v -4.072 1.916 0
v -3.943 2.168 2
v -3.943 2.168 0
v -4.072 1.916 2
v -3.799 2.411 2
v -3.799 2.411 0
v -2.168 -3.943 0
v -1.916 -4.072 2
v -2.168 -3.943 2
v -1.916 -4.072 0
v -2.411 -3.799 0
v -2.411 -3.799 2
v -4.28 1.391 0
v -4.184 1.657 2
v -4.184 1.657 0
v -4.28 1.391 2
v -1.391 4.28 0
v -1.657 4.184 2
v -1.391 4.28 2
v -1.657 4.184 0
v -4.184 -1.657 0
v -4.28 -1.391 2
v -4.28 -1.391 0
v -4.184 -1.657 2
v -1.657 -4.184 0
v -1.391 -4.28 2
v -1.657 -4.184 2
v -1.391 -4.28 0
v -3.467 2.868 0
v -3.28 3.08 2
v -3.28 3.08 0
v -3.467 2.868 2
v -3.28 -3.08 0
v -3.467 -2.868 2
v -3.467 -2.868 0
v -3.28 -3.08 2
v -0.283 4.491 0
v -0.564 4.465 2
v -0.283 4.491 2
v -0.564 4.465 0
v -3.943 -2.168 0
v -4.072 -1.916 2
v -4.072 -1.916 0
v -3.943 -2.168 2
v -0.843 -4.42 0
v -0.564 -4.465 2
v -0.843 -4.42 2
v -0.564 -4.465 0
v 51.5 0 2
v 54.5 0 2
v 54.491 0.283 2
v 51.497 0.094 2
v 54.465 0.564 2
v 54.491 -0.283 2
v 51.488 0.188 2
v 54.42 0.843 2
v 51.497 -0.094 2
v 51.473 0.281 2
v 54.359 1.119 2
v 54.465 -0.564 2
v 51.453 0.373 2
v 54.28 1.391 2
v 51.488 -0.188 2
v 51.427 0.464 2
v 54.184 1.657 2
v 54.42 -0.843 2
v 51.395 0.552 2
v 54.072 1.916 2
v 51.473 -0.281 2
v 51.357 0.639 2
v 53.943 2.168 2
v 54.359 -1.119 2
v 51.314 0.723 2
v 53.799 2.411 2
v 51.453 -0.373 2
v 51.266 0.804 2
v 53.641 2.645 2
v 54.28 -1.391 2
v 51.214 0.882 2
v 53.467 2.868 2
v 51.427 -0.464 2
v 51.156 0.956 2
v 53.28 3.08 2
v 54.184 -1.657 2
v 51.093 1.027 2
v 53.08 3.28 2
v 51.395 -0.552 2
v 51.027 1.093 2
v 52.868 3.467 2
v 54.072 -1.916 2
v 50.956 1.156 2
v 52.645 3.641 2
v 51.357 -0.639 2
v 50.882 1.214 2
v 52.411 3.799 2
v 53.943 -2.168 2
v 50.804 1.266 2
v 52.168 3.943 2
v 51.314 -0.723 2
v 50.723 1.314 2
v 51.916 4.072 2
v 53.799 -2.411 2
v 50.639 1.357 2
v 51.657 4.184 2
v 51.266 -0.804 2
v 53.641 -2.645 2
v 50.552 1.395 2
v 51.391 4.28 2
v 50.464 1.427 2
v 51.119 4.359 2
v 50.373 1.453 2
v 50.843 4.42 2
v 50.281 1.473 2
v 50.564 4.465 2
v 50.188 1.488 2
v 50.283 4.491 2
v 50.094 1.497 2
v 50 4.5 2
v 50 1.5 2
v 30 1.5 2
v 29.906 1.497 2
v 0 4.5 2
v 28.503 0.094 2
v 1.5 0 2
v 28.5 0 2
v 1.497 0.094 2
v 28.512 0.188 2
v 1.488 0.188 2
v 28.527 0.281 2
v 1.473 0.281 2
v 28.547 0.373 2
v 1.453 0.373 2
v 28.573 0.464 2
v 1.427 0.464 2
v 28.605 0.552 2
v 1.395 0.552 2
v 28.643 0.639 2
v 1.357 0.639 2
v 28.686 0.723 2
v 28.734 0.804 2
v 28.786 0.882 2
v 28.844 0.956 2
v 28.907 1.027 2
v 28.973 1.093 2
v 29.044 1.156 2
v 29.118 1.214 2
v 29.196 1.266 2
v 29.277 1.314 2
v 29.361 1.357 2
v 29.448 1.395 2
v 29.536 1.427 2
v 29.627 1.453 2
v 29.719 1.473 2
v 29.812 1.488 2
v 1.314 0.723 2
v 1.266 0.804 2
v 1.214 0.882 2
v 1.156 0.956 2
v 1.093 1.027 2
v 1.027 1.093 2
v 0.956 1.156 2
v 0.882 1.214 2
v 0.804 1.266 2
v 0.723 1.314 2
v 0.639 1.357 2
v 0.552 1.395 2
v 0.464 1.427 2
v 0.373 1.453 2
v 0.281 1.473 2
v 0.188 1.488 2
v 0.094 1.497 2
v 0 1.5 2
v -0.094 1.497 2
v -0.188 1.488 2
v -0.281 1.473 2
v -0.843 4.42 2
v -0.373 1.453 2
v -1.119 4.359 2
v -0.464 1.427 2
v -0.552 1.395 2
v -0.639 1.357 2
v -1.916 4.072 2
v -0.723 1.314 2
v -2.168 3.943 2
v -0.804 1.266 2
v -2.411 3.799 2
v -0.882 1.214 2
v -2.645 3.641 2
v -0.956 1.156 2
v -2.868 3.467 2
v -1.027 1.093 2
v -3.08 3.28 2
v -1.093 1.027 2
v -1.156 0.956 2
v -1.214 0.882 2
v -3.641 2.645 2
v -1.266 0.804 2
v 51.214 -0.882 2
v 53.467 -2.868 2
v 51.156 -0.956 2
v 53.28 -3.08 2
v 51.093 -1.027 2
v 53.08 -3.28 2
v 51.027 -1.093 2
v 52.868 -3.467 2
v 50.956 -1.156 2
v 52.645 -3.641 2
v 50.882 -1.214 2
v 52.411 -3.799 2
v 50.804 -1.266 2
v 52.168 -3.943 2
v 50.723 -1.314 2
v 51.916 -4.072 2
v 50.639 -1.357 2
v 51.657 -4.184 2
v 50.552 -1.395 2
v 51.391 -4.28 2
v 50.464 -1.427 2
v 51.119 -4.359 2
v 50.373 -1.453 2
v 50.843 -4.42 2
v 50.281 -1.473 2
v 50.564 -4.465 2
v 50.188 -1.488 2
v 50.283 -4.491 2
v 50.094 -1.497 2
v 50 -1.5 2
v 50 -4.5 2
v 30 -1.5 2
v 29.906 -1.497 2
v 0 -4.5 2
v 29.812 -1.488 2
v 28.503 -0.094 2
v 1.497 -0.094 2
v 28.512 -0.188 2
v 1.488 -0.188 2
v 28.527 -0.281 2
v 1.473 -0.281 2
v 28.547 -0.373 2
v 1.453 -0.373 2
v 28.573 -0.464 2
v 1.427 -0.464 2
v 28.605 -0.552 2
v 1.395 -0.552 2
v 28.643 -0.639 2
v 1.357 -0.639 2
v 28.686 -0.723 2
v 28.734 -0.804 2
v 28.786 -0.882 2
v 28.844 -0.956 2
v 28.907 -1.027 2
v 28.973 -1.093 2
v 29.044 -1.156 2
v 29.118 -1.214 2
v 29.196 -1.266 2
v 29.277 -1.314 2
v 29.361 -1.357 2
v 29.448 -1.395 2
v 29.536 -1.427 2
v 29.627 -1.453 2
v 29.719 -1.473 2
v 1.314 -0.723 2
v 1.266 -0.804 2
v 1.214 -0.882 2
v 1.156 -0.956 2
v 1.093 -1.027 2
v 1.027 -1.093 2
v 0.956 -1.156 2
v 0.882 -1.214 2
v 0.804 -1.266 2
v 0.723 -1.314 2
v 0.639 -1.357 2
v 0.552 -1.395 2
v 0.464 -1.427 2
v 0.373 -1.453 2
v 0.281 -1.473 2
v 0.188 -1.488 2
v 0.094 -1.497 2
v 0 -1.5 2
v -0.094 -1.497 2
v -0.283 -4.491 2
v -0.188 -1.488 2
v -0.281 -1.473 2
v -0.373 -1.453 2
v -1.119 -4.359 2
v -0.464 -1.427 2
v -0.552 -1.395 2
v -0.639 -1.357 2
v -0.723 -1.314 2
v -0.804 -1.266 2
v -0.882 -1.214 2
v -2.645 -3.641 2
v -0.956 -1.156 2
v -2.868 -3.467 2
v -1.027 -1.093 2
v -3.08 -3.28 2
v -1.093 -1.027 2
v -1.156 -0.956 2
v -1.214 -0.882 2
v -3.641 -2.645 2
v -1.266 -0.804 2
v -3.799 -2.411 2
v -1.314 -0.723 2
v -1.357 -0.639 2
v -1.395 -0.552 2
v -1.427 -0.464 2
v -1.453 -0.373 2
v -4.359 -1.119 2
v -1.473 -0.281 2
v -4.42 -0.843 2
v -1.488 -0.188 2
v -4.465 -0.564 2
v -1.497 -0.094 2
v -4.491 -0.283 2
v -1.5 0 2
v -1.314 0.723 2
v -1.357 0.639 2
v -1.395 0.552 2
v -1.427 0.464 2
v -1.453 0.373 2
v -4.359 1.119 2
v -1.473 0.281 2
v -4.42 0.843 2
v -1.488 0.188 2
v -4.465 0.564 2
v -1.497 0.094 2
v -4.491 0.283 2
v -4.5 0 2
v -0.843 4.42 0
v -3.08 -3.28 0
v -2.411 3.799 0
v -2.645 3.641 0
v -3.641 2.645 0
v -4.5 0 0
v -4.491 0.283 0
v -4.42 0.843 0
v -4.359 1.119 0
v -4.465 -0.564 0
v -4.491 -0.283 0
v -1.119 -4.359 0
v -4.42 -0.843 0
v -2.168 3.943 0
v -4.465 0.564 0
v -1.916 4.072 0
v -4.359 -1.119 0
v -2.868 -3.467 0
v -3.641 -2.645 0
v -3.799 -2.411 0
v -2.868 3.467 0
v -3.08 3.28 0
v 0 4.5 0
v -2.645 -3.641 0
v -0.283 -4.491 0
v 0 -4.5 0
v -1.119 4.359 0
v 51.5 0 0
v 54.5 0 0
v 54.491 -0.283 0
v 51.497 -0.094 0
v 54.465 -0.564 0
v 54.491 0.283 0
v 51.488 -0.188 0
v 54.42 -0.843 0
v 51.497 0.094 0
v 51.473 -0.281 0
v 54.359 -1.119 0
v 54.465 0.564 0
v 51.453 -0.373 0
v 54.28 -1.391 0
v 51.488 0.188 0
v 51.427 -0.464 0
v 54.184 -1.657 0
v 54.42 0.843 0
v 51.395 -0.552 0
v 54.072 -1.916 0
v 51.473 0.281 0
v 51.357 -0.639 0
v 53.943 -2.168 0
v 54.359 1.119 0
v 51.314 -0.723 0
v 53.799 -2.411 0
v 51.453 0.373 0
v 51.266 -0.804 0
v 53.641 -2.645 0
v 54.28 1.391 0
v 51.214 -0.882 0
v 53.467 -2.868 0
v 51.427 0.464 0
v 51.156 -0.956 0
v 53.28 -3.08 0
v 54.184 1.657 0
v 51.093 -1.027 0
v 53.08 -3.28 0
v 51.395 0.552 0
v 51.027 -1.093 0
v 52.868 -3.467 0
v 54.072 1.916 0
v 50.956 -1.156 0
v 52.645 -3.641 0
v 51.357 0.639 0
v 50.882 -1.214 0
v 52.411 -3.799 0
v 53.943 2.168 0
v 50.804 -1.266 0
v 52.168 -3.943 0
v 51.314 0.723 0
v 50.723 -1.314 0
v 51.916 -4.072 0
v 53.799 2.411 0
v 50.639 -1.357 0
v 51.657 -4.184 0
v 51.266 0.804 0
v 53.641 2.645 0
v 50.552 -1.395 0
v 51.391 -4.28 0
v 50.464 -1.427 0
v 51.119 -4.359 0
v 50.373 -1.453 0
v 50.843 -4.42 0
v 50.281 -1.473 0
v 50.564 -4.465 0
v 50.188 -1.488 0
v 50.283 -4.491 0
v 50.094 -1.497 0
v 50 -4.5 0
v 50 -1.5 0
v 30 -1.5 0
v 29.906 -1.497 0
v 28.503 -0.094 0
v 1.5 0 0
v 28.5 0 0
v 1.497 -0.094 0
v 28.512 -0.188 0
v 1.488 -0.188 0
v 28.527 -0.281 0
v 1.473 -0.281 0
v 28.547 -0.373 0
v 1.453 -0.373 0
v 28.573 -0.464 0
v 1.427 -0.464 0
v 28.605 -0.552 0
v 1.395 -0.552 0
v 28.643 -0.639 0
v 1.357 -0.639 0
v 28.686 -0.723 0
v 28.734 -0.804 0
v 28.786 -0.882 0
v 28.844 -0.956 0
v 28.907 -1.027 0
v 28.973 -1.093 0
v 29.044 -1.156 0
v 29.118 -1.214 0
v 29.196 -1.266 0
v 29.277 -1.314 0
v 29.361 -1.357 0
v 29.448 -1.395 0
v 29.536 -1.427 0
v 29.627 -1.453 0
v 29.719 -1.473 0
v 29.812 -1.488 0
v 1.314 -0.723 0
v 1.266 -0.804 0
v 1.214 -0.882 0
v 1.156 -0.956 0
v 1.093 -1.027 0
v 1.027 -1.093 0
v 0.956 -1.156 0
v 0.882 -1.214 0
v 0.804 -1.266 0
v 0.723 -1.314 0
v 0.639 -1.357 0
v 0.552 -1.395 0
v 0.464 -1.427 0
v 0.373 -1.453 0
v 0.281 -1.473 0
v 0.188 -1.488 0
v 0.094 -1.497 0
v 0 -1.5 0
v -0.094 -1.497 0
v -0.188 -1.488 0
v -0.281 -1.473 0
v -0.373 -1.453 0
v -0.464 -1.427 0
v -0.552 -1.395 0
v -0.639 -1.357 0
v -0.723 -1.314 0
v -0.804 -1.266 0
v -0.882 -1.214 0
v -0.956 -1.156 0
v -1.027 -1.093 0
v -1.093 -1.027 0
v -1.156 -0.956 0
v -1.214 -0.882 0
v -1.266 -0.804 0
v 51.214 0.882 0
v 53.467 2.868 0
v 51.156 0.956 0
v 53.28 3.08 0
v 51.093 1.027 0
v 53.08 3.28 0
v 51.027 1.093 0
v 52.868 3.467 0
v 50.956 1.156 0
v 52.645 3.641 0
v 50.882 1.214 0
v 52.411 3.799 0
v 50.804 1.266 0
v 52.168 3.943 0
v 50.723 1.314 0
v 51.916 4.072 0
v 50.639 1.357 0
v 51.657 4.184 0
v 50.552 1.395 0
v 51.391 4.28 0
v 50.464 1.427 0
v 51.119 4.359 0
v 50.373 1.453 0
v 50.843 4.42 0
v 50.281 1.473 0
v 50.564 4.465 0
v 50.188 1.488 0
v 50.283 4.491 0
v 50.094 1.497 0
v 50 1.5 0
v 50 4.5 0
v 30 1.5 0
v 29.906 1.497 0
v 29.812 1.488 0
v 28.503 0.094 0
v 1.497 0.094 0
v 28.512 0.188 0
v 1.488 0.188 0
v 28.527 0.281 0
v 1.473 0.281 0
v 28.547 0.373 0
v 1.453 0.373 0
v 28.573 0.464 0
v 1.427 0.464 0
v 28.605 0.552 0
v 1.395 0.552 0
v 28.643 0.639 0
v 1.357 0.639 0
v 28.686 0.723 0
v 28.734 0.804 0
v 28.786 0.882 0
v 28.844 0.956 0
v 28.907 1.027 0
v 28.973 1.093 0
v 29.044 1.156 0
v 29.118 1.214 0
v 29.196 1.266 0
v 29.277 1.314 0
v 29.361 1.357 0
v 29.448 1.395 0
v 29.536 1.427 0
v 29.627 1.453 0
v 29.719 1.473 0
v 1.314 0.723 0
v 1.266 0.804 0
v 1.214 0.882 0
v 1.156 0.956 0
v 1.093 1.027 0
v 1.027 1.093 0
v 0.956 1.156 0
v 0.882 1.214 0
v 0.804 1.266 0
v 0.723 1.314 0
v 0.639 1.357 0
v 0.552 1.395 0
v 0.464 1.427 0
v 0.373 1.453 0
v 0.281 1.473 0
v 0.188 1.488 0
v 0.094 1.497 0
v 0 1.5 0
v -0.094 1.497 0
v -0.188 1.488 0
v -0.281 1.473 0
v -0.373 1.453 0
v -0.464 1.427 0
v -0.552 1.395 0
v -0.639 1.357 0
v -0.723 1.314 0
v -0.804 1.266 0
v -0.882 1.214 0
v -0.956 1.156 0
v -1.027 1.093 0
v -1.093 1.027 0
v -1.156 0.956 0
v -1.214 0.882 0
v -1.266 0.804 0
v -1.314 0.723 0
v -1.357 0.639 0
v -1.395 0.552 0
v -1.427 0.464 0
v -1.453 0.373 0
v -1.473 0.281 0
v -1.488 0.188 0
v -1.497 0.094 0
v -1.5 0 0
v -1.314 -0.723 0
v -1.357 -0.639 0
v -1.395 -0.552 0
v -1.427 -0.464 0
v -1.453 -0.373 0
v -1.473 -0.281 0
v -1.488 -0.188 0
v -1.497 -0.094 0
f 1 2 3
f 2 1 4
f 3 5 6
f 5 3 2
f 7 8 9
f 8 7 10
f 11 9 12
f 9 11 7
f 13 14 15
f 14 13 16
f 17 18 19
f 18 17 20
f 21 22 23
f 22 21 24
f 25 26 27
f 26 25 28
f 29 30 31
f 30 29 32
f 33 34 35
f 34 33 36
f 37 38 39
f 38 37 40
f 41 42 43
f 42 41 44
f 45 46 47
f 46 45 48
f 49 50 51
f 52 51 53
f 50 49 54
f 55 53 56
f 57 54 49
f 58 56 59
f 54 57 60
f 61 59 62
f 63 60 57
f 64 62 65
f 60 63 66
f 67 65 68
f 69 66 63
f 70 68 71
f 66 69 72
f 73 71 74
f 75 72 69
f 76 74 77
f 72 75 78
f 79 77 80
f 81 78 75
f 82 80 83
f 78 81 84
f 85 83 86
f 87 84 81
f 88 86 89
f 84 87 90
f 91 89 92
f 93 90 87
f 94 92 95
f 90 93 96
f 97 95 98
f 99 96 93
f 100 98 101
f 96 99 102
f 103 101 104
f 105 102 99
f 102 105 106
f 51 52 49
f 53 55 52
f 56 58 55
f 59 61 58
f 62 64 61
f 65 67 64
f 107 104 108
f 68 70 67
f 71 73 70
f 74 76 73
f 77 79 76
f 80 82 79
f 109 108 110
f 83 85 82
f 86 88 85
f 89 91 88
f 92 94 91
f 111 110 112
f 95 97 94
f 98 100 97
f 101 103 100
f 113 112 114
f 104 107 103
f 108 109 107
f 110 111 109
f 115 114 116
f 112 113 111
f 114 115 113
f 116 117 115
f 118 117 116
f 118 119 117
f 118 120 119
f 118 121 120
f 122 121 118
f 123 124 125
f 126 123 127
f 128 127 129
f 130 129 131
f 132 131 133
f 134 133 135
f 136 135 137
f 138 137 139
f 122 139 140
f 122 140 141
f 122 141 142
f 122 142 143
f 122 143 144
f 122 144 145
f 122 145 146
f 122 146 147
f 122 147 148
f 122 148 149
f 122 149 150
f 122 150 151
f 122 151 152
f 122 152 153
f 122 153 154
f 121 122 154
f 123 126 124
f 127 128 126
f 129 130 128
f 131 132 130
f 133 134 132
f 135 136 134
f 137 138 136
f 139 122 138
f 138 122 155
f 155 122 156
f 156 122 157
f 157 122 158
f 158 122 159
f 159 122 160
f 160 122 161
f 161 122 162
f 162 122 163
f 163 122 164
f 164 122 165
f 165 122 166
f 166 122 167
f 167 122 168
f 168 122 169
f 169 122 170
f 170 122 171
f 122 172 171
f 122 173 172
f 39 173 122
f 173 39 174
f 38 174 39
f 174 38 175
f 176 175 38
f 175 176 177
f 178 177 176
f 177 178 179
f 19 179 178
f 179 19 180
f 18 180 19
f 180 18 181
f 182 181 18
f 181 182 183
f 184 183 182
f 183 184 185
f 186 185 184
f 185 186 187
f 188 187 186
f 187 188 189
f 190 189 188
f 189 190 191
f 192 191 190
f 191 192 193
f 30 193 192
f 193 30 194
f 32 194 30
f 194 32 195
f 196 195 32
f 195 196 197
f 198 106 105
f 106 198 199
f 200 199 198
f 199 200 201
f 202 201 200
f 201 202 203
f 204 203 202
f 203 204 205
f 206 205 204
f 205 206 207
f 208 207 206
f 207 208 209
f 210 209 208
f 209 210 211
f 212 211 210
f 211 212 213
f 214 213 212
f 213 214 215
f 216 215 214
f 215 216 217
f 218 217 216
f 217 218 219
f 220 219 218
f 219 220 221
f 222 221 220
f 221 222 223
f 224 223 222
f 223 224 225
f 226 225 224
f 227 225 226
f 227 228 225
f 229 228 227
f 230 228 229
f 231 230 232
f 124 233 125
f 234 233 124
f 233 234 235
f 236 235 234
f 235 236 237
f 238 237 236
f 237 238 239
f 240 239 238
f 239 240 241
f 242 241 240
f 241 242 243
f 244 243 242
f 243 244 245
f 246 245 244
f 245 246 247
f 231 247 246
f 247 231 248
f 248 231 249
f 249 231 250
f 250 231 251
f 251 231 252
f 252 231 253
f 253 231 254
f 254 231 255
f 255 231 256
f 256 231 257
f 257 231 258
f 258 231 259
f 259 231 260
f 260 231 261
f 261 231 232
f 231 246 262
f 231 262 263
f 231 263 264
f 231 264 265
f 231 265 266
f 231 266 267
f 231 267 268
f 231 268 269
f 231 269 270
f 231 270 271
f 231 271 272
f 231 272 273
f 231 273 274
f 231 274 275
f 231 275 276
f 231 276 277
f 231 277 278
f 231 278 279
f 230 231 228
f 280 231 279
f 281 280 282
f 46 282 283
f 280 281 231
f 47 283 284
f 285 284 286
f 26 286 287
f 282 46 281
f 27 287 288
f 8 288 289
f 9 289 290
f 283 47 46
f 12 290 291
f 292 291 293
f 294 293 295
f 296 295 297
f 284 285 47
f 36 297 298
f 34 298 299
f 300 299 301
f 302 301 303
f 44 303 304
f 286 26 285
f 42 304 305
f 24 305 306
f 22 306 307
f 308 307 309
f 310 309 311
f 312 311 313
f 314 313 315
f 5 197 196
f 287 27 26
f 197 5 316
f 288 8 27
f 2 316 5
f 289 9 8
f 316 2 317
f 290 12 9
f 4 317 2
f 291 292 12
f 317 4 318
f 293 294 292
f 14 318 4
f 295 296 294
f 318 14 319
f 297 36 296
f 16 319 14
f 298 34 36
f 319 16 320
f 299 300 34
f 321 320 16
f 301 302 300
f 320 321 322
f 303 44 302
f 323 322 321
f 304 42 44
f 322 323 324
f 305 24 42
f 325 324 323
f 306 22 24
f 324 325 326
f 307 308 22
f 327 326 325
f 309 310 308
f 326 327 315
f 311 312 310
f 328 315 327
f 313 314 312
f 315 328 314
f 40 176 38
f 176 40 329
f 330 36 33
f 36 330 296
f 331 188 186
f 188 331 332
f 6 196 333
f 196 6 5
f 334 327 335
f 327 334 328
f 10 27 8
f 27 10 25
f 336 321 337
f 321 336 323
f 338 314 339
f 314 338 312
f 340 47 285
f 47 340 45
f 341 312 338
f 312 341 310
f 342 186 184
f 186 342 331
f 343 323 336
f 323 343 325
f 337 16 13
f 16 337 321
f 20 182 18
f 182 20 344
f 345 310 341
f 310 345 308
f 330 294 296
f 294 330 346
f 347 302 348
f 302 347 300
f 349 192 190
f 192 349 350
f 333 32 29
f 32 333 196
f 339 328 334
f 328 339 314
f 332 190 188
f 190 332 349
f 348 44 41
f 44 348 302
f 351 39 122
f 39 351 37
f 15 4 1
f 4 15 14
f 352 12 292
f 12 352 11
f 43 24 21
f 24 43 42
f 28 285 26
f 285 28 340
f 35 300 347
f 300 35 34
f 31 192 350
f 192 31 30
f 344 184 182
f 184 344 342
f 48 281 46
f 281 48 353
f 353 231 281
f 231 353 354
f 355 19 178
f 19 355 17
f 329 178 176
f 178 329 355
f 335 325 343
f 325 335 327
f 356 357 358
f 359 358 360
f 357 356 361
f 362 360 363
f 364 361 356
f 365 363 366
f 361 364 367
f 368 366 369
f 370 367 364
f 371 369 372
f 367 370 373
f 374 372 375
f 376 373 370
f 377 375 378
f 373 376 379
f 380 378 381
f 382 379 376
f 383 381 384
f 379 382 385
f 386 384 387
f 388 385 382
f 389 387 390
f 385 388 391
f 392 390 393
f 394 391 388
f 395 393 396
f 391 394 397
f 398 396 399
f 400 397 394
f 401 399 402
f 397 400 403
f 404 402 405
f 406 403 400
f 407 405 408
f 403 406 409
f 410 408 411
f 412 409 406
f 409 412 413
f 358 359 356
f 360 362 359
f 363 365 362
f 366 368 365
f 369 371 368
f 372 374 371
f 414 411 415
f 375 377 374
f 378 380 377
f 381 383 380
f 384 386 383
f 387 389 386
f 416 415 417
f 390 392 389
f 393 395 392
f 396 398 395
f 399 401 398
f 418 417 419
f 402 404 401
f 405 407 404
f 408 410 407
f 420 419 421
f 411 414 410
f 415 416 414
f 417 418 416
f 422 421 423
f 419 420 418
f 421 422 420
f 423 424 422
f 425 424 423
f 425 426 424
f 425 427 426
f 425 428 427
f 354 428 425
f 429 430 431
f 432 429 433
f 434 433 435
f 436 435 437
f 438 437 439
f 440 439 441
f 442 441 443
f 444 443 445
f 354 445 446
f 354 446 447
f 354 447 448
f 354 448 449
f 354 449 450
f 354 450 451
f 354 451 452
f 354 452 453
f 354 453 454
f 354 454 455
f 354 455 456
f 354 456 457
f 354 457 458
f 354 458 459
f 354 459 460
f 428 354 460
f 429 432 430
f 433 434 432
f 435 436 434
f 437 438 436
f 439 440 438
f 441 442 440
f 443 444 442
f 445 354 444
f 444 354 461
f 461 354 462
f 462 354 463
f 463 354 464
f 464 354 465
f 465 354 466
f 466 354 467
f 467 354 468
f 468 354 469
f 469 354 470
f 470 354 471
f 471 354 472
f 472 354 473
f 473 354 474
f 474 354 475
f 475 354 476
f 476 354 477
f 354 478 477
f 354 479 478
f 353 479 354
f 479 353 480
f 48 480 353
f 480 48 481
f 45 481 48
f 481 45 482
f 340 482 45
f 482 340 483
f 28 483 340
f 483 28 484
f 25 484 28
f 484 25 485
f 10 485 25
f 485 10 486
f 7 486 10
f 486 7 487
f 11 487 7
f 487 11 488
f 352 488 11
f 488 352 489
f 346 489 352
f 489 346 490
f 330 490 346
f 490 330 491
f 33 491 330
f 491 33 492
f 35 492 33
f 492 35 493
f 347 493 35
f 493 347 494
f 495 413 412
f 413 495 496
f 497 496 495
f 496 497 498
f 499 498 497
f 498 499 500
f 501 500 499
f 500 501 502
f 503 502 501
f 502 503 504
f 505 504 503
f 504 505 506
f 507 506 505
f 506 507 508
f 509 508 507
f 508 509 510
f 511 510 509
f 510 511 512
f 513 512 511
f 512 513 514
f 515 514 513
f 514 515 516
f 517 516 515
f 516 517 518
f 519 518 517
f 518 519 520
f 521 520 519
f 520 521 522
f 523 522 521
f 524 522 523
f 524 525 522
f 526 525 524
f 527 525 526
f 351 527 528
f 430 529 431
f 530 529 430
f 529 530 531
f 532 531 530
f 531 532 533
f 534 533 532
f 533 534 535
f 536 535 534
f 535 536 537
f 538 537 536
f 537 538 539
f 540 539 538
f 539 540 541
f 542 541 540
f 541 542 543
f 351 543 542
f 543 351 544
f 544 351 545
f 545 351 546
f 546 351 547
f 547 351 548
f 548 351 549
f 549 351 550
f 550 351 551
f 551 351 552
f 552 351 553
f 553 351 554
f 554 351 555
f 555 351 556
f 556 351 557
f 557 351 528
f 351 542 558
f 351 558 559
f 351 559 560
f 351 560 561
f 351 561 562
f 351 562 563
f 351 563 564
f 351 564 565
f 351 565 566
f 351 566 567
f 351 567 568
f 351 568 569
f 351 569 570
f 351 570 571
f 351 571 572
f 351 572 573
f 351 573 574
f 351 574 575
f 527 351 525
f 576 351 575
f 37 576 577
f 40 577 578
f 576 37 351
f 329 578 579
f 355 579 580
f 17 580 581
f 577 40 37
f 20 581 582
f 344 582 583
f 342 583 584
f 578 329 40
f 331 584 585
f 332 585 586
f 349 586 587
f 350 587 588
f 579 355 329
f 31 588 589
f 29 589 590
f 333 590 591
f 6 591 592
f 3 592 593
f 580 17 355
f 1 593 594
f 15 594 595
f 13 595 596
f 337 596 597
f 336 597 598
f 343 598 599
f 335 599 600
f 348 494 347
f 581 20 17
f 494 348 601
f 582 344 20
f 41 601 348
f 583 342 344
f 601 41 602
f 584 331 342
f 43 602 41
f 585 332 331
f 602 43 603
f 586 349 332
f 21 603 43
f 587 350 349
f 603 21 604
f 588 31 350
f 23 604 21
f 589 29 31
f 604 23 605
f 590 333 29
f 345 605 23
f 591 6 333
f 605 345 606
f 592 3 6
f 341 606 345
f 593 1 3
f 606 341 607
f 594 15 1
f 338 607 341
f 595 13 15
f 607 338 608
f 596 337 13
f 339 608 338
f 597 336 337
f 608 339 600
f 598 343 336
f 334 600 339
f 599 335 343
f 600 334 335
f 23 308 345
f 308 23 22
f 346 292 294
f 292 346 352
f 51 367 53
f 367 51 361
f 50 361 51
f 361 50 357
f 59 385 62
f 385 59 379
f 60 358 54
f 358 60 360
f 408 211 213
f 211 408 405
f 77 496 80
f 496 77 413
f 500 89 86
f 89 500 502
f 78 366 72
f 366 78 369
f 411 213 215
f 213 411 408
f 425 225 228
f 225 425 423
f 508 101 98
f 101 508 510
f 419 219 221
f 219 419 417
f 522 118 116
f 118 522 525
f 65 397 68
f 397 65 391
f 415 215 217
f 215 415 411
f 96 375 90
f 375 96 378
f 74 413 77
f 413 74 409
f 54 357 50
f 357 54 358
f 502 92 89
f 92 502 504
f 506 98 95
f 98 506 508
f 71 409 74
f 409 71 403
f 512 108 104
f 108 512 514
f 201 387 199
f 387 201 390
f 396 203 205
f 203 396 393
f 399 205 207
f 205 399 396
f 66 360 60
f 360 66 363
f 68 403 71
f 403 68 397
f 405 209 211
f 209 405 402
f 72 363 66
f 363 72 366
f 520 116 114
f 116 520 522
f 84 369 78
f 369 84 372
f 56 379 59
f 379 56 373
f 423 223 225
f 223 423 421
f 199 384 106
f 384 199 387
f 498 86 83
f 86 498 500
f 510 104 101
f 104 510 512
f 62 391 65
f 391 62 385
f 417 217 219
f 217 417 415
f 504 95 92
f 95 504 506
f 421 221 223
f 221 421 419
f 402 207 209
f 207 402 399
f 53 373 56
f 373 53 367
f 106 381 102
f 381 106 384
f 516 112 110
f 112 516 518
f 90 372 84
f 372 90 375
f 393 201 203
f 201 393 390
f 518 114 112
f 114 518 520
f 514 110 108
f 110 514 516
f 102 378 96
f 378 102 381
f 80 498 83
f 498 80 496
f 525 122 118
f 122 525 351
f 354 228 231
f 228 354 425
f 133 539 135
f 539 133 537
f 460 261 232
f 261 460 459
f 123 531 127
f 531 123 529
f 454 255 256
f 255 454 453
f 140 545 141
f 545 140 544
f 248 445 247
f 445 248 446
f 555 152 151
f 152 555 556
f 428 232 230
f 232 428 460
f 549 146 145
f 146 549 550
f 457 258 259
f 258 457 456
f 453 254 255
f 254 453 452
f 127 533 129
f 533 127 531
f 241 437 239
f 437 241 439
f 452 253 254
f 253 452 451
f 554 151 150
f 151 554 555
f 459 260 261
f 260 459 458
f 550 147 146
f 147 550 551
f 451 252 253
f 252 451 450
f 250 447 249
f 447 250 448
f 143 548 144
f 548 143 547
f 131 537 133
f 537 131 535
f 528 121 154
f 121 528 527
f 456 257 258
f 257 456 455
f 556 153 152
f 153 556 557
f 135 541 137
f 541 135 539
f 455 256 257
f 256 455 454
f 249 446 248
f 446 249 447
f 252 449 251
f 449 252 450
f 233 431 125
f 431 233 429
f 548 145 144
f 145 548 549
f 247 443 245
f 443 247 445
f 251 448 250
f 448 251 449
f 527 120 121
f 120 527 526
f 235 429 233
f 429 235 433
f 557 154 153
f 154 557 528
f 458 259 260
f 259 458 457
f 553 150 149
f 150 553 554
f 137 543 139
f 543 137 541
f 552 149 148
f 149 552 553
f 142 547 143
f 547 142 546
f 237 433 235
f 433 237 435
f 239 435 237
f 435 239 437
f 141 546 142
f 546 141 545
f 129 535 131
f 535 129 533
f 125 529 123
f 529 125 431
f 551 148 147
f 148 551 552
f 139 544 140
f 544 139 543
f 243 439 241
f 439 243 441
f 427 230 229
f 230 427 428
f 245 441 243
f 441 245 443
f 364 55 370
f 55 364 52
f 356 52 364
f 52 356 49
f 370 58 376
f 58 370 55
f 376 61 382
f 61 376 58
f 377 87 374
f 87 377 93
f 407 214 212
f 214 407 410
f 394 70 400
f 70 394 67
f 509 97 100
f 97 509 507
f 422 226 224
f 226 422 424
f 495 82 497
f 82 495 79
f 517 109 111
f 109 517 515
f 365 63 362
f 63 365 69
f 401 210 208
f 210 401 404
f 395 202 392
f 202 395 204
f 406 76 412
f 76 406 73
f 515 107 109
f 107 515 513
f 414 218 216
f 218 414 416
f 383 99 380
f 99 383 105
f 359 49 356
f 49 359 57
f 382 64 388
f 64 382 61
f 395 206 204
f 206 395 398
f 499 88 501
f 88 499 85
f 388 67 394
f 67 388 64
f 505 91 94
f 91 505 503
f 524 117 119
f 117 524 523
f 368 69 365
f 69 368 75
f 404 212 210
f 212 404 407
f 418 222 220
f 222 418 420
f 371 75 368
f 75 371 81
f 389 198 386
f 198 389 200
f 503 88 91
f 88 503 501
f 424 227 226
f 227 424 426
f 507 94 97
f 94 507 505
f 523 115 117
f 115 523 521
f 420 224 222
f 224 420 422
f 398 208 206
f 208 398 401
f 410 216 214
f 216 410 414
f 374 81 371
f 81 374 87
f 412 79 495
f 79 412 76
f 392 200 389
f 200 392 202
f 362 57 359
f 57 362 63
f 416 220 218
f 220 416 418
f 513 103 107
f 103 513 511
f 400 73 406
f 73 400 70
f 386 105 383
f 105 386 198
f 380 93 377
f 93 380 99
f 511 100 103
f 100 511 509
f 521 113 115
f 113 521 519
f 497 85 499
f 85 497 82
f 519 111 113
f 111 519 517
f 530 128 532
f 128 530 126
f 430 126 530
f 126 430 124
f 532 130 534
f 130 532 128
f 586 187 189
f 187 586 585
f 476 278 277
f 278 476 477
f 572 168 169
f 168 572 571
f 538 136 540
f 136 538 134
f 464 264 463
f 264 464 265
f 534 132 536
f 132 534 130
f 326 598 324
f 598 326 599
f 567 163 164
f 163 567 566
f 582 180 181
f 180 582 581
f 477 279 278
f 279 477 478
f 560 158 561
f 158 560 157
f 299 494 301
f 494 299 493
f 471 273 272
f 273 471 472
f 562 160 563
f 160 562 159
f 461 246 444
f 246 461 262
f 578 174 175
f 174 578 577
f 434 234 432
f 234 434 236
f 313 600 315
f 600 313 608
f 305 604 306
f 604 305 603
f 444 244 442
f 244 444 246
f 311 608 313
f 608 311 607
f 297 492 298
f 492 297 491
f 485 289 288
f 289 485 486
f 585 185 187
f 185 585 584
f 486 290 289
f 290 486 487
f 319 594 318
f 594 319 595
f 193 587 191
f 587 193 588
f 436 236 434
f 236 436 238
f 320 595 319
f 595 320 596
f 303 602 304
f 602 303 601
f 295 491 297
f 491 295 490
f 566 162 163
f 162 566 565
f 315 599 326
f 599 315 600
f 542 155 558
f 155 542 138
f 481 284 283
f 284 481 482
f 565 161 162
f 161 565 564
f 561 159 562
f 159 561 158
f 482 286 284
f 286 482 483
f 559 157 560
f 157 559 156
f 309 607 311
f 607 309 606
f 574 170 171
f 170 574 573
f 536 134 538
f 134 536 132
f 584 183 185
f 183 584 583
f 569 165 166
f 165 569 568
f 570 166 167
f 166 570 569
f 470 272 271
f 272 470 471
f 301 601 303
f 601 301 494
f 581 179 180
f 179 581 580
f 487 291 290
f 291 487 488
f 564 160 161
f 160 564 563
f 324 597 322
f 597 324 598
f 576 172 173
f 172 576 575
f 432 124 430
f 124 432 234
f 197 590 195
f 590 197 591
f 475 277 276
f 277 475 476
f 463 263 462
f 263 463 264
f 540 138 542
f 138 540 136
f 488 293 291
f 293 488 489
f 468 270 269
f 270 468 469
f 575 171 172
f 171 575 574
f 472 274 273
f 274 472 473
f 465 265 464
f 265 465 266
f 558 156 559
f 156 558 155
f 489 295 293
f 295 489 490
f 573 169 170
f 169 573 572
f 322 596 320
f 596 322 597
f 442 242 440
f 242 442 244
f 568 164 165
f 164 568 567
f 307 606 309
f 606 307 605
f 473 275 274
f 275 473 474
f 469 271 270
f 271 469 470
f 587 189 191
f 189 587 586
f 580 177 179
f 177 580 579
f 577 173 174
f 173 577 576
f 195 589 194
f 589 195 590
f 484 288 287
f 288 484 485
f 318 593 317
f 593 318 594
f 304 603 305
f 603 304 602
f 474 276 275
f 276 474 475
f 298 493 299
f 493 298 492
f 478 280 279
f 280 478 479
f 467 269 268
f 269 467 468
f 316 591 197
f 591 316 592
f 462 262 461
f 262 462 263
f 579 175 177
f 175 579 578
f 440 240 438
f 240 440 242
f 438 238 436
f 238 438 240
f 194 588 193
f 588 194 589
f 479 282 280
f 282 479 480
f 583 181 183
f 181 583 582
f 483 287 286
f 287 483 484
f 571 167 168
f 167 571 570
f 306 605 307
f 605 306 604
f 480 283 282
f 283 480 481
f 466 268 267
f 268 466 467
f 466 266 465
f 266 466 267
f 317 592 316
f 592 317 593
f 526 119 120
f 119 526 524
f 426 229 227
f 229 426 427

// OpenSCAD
//Adjustable link
//By Johan Bengtsson qwerty_42@hotmail.com


//(in mm)
HoleSize=3;

//(in mm)
Distance1=30;

//(in mm)
Distance2=50;

//(in mm)
Thickness=2;


//(in percent of hole size)
WallWidth=100;

/* [Hidden] */

Width=HoleSize*(1+WallWidth/50);
MinDistance=min(Distance1,Distance2);
MaxDistance=max(Distance1,Distance2);

$fn=100;

difference()
{
	union()
	{
		cylinder(h=Thickness,r=Width/2);
		translate([MaxDistance,0,0]) cylinder(h=Thickness,r=Width/2);
		translate([0,-Width/2,0]) cube([MaxDistance,Width,Thickness]);
	}
	union()
	{
		translate([MinDistance,0,-1]) cylinder(h=Thickness+2,r=HoleSize/2);
		translate([MaxDistance,0,-1]) cylinder(h=Thickness+2,r=HoleSize/2);
		translate([0,0,-1]) cylinder(h=Thickness+2,r=HoleSize/2);
		translate([MinDistance,-HoleSize/2,-1]) cube([MaxDistance-MinDistance,HoleSize,Thickness+2]);
	}
}
